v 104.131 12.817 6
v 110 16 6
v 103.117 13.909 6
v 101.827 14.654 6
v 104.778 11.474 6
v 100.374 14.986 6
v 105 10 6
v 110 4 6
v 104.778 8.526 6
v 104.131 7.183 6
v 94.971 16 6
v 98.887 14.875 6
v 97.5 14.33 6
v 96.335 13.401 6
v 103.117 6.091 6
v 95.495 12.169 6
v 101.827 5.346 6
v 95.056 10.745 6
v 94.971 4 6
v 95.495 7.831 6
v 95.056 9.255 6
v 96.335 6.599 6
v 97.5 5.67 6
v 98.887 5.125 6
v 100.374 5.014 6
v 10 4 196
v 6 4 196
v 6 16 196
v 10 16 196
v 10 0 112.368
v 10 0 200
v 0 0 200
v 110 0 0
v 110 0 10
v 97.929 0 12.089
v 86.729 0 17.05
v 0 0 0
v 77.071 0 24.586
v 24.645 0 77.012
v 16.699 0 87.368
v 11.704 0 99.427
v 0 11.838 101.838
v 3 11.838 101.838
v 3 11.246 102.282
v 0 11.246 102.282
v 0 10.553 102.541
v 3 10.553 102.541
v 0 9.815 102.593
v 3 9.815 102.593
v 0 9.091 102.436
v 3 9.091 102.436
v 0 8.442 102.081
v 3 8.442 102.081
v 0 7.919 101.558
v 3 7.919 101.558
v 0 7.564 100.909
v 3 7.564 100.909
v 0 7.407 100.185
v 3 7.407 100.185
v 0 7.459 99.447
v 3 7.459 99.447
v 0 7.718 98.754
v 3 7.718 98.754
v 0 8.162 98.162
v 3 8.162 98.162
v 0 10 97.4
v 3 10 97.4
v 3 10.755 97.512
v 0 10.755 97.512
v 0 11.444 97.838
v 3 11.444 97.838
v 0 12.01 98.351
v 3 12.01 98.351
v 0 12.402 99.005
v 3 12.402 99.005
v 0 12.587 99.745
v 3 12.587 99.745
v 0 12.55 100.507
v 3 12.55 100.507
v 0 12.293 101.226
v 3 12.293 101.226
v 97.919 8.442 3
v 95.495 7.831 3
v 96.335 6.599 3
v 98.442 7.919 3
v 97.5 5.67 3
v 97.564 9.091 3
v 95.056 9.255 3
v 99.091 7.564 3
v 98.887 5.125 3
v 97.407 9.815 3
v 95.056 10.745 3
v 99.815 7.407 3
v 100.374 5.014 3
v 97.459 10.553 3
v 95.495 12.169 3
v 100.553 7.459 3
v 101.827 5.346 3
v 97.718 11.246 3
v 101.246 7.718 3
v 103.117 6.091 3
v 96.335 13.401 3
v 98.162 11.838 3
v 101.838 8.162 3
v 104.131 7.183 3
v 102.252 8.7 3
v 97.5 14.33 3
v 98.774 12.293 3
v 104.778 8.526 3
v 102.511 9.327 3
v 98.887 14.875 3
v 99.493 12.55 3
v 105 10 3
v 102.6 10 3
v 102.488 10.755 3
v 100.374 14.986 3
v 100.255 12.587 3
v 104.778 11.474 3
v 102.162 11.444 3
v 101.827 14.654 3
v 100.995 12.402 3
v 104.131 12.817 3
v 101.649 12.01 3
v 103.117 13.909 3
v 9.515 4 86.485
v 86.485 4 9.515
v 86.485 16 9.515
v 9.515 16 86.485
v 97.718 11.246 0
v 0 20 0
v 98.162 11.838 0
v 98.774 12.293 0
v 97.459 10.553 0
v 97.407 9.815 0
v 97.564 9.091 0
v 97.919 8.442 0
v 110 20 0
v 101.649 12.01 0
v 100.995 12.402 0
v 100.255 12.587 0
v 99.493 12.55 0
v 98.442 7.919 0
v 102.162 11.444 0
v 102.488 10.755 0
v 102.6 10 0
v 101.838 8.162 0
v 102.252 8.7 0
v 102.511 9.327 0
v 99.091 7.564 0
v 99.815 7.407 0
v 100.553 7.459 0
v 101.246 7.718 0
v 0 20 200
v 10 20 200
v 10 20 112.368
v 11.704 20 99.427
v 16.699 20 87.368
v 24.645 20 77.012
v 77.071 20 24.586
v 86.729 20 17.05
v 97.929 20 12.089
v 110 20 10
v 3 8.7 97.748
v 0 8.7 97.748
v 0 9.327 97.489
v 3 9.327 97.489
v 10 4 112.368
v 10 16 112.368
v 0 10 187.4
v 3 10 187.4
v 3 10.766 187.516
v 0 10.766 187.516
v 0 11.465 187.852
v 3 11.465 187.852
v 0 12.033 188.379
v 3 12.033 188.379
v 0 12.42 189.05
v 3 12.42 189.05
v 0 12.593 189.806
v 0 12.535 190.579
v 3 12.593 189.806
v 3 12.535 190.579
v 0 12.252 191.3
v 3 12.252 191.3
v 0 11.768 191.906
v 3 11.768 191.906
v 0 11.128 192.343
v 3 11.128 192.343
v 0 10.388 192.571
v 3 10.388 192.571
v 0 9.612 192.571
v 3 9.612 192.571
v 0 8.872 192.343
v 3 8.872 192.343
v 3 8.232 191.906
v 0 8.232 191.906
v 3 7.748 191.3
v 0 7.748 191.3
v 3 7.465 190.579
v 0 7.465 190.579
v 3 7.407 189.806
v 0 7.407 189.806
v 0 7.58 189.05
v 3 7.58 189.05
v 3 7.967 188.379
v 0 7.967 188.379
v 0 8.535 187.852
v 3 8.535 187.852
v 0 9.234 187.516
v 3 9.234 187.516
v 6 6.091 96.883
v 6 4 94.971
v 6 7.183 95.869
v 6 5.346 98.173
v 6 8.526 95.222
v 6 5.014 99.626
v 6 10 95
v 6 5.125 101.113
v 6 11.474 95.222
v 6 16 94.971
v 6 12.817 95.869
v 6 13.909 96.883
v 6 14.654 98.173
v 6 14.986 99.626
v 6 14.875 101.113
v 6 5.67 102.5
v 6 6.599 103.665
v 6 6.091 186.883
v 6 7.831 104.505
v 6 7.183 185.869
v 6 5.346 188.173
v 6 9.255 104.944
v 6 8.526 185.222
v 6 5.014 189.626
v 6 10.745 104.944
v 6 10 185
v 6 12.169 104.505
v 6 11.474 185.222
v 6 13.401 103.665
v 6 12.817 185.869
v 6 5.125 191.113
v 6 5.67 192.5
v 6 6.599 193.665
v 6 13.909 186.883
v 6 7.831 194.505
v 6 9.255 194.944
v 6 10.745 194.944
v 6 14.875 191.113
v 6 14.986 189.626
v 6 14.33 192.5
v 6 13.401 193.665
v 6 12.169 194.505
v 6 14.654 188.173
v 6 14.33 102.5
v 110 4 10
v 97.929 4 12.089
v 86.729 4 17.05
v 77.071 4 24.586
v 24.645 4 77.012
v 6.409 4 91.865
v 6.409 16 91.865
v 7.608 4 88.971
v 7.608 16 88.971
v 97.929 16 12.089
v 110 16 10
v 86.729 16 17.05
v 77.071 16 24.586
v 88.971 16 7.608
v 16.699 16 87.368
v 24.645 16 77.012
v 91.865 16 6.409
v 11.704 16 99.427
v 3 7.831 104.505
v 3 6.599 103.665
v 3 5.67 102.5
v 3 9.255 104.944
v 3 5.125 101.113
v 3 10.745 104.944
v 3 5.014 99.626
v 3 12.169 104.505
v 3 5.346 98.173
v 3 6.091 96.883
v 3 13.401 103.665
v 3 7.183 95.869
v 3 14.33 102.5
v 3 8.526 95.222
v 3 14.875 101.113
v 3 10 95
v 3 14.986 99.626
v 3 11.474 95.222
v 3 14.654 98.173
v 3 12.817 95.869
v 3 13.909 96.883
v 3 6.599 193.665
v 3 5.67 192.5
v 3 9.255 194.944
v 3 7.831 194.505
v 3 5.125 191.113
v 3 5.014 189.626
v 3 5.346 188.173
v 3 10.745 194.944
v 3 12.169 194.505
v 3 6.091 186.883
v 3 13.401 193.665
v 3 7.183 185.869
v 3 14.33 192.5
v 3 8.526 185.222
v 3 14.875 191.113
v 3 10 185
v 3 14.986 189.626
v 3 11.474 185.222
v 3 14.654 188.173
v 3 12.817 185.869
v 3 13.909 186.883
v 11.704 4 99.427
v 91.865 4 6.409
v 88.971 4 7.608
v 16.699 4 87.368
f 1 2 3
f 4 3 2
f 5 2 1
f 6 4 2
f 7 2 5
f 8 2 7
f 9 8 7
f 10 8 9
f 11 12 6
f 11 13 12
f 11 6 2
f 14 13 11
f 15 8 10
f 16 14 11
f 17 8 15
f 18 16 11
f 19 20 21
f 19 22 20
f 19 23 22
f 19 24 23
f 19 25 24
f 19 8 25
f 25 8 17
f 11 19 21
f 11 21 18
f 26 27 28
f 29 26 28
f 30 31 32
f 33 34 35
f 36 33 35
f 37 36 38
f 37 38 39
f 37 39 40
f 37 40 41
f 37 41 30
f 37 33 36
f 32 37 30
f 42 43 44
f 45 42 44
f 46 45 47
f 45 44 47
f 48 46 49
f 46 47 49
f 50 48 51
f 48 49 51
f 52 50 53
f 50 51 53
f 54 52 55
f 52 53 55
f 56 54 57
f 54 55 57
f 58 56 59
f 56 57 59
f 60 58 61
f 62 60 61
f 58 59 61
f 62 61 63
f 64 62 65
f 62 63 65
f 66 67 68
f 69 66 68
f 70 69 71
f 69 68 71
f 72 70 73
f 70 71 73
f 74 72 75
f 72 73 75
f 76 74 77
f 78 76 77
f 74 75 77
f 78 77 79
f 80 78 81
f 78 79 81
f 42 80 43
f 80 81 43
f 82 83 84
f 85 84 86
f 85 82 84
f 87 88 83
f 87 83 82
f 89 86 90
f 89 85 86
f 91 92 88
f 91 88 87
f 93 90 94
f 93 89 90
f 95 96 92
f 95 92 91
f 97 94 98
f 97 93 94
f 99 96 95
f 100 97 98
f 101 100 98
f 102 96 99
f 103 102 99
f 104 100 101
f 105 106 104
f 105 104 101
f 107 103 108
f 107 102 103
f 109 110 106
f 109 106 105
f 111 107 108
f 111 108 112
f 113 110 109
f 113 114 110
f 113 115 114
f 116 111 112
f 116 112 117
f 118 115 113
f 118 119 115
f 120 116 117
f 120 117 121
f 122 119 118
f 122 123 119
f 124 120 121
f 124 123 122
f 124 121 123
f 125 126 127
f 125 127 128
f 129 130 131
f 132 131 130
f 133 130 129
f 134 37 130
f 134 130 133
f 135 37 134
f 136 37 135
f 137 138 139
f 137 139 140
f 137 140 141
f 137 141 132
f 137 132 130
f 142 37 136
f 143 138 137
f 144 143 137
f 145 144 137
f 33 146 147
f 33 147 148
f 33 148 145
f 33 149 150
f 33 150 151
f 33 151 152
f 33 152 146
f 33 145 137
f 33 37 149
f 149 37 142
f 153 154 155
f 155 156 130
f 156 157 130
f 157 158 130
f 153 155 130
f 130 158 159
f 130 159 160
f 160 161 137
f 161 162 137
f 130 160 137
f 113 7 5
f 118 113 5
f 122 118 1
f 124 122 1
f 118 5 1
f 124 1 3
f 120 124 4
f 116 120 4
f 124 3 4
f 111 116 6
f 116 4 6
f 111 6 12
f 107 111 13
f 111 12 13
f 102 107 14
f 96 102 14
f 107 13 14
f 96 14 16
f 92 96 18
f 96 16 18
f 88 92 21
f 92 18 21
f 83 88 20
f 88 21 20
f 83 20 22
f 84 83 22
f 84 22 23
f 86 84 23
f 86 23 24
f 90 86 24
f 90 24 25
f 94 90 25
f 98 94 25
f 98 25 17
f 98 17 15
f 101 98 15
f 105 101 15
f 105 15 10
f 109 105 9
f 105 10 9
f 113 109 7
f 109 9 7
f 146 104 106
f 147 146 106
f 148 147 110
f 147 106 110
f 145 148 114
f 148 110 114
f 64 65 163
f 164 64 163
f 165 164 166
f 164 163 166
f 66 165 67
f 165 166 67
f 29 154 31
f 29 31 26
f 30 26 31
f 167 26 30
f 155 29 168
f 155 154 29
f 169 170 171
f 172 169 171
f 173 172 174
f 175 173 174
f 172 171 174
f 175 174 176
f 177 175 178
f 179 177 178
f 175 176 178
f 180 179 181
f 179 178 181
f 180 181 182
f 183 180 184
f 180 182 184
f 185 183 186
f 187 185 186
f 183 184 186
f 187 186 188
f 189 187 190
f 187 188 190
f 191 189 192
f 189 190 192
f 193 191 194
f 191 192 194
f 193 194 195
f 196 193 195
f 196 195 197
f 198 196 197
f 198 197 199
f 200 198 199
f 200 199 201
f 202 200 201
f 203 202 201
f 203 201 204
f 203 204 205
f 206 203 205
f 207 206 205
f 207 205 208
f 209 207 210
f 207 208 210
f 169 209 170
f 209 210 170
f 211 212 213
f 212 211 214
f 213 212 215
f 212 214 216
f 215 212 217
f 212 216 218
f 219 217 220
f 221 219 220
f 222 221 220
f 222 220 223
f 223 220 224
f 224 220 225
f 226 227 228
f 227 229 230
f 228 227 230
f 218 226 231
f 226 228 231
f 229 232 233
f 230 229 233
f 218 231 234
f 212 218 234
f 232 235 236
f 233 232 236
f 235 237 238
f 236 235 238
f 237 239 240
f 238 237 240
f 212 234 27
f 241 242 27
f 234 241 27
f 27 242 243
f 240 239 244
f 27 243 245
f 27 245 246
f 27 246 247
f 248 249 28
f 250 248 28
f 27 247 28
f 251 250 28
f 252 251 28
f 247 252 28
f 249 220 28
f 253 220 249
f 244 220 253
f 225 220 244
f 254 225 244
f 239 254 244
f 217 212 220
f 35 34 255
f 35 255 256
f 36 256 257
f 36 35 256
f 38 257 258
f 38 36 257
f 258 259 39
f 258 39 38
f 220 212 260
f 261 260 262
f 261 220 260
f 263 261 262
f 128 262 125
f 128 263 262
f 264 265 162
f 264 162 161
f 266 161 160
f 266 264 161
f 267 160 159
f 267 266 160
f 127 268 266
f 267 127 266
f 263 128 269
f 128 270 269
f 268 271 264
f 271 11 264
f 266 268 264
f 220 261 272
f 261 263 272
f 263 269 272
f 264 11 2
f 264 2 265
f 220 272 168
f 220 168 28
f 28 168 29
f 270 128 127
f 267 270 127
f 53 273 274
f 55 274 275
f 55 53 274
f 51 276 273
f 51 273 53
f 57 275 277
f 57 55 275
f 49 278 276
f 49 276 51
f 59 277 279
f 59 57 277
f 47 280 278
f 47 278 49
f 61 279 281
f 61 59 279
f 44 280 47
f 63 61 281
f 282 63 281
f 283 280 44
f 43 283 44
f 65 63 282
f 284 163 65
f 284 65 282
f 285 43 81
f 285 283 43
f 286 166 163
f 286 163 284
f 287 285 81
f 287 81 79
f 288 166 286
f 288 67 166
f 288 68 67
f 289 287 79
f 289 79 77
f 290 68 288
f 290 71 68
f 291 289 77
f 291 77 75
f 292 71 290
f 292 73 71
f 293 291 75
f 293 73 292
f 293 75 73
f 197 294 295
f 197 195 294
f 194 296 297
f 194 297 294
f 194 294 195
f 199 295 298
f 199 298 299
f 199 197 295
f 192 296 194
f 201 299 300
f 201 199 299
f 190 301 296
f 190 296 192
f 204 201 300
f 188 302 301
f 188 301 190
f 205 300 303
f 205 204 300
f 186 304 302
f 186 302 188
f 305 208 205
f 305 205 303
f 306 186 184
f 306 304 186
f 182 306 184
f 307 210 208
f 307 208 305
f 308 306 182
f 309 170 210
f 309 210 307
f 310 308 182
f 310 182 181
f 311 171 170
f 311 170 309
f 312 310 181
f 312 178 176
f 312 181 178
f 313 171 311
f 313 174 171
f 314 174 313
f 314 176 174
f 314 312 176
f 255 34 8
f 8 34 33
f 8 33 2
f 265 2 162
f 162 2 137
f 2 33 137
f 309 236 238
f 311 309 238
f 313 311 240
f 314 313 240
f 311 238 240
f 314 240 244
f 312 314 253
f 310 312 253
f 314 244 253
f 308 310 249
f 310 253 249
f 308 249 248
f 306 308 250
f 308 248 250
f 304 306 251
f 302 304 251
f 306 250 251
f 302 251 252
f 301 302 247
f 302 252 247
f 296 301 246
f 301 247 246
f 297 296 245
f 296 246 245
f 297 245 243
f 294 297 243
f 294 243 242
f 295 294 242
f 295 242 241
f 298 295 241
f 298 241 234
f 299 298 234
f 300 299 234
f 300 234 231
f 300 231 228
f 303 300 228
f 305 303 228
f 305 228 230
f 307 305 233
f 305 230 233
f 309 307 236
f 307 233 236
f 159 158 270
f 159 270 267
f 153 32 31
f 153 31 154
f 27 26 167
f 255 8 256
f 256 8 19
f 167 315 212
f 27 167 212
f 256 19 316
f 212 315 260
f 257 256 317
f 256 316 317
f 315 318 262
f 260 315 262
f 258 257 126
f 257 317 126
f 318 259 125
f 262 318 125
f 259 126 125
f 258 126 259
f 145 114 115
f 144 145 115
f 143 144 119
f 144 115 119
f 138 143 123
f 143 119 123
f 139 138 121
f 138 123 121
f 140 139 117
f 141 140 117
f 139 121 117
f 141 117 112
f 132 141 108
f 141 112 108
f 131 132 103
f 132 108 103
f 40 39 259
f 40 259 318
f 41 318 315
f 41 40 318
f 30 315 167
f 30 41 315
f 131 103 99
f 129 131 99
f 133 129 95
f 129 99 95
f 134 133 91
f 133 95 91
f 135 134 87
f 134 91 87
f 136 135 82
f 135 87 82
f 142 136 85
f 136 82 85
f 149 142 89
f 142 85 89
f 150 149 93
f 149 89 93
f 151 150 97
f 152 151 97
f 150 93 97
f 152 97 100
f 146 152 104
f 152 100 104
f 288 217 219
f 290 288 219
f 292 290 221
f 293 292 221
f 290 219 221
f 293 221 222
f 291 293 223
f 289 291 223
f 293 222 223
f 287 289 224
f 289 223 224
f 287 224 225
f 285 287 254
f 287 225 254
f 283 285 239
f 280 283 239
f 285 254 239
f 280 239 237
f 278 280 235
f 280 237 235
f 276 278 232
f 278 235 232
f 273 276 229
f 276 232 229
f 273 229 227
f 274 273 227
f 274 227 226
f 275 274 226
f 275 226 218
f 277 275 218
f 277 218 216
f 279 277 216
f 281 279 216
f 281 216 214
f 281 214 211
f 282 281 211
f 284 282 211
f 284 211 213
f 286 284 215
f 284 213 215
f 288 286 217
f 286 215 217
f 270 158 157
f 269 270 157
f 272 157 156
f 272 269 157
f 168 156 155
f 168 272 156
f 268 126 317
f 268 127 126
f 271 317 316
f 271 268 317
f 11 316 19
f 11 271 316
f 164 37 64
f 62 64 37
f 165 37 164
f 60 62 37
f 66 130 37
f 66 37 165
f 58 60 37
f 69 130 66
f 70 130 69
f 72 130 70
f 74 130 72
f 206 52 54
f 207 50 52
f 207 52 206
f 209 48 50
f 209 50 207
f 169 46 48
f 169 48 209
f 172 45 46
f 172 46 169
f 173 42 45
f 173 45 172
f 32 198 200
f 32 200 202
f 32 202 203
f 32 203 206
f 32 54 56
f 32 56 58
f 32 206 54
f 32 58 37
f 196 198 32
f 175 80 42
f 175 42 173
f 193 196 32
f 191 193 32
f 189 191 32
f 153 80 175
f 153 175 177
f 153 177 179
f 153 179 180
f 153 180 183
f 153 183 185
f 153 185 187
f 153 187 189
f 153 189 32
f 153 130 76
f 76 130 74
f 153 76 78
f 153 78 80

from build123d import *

# Parameters (mm, degrees)
EXTRUDE_1_DEPTH     = 20
CUT_EXTRUDE_1_DEPTH = 20
SKETCH_3_R          = 5
CUT_EXTRUDE_2_DEPTH = 3
CUT_EXTRUDE_3_DEPTH = 6
SKETCH_5_R          = 5
CUT_EXTRUDE_4_DEPTH = 3
SKETCH_6_W          = 90
SKETCH_6_H          = 20
EXTRUDE_2_DEPTH     = 6
SKETCH_7_R          = 5
CUT_EXTRUDE_5_DEPTH = 3
SKETCH_8_R          = 2.6
CUT_EXTRUDE_6_DEPTH = 3
SKETCH_11_W         = 118.79393924
SKETCH_11_H         = 4
EXTRUDE_4_DEPTH     = 4
SKETCH_12_W         = 110
SKETCH_12_H         = 4
EXTRUDE_5_DEPTH     = 4
SKETCH_13_W         = 20
SKETCH_13_H         = 4
EXTRUDE_6_DEPTH     = 4
FILLET_2_R          = 12
FILLET_3_R          = 50
SKETCH_14_W         = 4
SKETCH_14_H         = 12
EXTRUDE_7_DEPTH     = 4


with BuildPart() as part:
    # 草图1 → 凸台-拉伸1 (new body)
    with BuildSketch(Plane(origin=(0, 0, 0), x_dir=(1, 0, 0), z_dir=(0, 1, 0))):
        Polygon((0, 0), (110, 0), (110, -6), (90, -6), (6, -90), (6, -110), (0, -110), align=None)
    extrude(amount=EXTRUDE_1_DEPTH)

    # 草图2 → 切除-拉伸1 (cut)
    with BuildSketch(Plane(origin=(6, 0, 0), x_dir=(0, 0, -1), z_dir=(1, 0, 0))):
        with BuildLine():
            ThreePointArc((-97.4, 10), (-99.005023076, 12.402086785), (-101.838477631, 11.838477631))
            Line((-101.838477631, 11.838477631), (-98.161522369, 8.161522369))
            ThreePointArc((-98.161522369, 8.161522369), (-97.597913215, 9.005023076), (-97.4, 10))
        make_face()
        with BuildLine():
            Line((-98.161522369, 8.161522369), (-101.838477631, 11.838477631))
            ThreePointArc((-101.838477631, 11.838477631), (-101.838477631, 8.161522369), (-98.161522369, 8.161522369))
        make_face()
    extrude(amount=-CUT_EXTRUDE_1_DEPTH, mode=Mode.SUBTRACT)

    # 草图3 → 切除-拉伸2 (cut)
    with BuildSketch(Plane(origin=(6, 0, 0), x_dir=(0, 0, -1), z_dir=(1, 0, 0))):
        with Locations((-100, 10)):
            Circle(SKETCH_3_R)
    extrude(amount=-CUT_EXTRUDE_2_DEPTH, mode=Mode.SUBTRACT)

    # 草图4 → 切除-拉伸3 (cut)
    with BuildSketch(Plane.XY.offset(6)):
        with BuildLine():
            ThreePointArc((102.6, 10), (100.994976924, 12.402086785), (98.161522369, 11.838477631))
            Line((98.161522369, 11.838477631), (101.838477631, 8.161522369))
            ThreePointArc((101.838477631, 8.161522369), (102.402086785, 9.005023076), (102.6, 10))
        make_face()
        with BuildLine():
            Line((101.838477631, 8.161522369), (98.161522369, 11.838477631))
            ThreePointArc((98.161522369, 11.838477631), (98.161522369, 8.161522369), (101.838477631, 8.161522369))
        make_face()
    extrude(amount=-CUT_EXTRUDE_3_DEPTH, mode=Mode.SUBTRACT)

    # 草图5 → 切除-拉伸4 (cut)
    with BuildSketch(Plane.XY.offset(6)):
        with Locations((100, 10)):
            Circle(SKETCH_5_R)
    extrude(amount=-CUT_EXTRUDE_4_DEPTH, mode=Mode.SUBTRACT)

    # 草图6 → 凸台-拉伸2 (add)
    with BuildSketch(Plane.ZY):
        with Locations((155, 10)):
            Rectangle(SKETCH_6_W, SKETCH_6_H)
    extrude(amount=-EXTRUDE_2_DEPTH)

    # 草图7 → 切除-拉伸5 (cut)
    with BuildSketch(Plane(origin=(6, 0, 0), x_dir=(0, 0, -1), z_dir=(1, 0, 0))):
        with Locations((-190, 10)):
            Circle(SKETCH_7_R)
    extrude(amount=-CUT_EXTRUDE_5_DEPTH, mode=Mode.SUBTRACT)

    # 草图8 → 切除-拉伸6 (cut)
    with BuildSketch(Plane(origin=(3, 0, 0), x_dir=(0, 0, -1), z_dir=(1, 0, 0))):
        with Locations((-190, 10)):
            Circle(SKETCH_8_R)
    extrude(amount=-CUT_EXTRUDE_6_DEPTH, mode=Mode.SUBTRACT)

    # 草图11 → 凸台-拉伸4 (add)
    with BuildSketch(Plane(origin=(48, 0, 48), x_dir=(0.7071067811865475, 0, -0.7071067811865476), z_dir=(0.7071067811865476, 0, 0.7071067811865475))):
        with Locations((0, 18)):
            Rectangle(SKETCH_11_W, SKETCH_11_H)
        with Locations((0, 2)):
            Rectangle(SKETCH_11_W, SKETCH_11_H)
    extrude(amount=EXTRUDE_4_DEPTH)

    # 草图12 → 凸台-拉伸5 (add)
    with BuildSketch(Plane(origin=(6, 0, 0), x_dir=(0, 0, -1), z_dir=(1, 0, 0))):
        with Locations((-145, 18)):
            Rectangle(SKETCH_12_W, SKETCH_12_H)
        with Locations((-145, 2)):
            Rectangle(SKETCH_12_W, SKETCH_12_H)
    extrude(amount=EXTRUDE_5_DEPTH)

    # 草图13 → 凸台-拉伸6 (add)
    with BuildSketch(Plane.XY.offset(6)):
        with Locations((100, 18)):
            Rectangle(SKETCH_13_W, SKETCH_13_H)
        with Locations((100, 2)):
            Rectangle(SKETCH_13_W, SKETCH_13_H)
    extrude(amount=EXTRUDE_6_DEPTH)

    # 圆角2
    fillet_2_edges = [part.edges().sort_by_distance(p)[0] for p in [
        (90, 10, 6),
        (6, 10, 90),
    ]]
    fillet(fillet_2_edges, radius=FILLET_2_R)

    # 圆角3
    # the kernel refuses this fillet: 50 mm, written as the material it adds along each edge
    with BuildSketch(Plane(origin=(10, 0, 91.656854249), x_dir=(0, 0, 1), z_dir=(0, 1, 0))) as fillet_3_piece_1:
        with BuildLine():
            CenterArc((FILLET_3_R * 0.414213562373, FILLET_3_R), FILLET_3_R, 225, 45)
            Line((-FILLET_3_R * 0.292893218813, FILLET_3_R * 0.292893218813), (-FILLET_3_R * 0.307035354437, FILLET_3_R * 0.27875108319))
            Line((-FILLET_3_R * 0.307035354437, FILLET_3_R * 0.27875108319), (-FILLET_3_R * 0.00828427124746, -FILLET_3_R * 0.02))
            Line((-FILLET_3_R * 0.00828427124746, -FILLET_3_R * 0.02), (FILLET_3_R * 0.414213562373, -FILLET_3_R * 0.02))
            Line((FILLET_3_R * 0.414213562373, -FILLET_3_R * 0.02), (FILLET_3_R * 0.414213562373, 0))
        make_face()
    extrude(amount=4)
    with BuildSketch(Plane(origin=(10, 0, 91.656854249), x_dir=(0, 0, 1), z_dir=(0, 1, 0))) as fillet_3_piece_2_section:
        with BuildLine():
            CenterArc((FILLET_3_R * 0.414213562373, FILLET_3_R), FILLET_3_R, 225, 45)
            Line((-FILLET_3_R * 0.292893218813, FILLET_3_R * 0.292893218813), (-FILLET_3_R * 0.307035354437, FILLET_3_R * 0.27875108319))
            Line((-FILLET_3_R * 0.307035354437, FILLET_3_R * 0.27875108319), (-FILLET_3_R * 0.00828427124746, -FILLET_3_R * 0.02))
            Line((-FILLET_3_R * 0.00828427124746, -FILLET_3_R * 0.02), (FILLET_3_R * 0.414213562373, -FILLET_3_R * 0.02))
            Line((FILLET_3_R * 0.414213562373, -FILLET_3_R * 0.02), (FILLET_3_R * 0.414213562373, 0))
        make_face()
    fillet_3_piece_2 = extrude(amount=55.776695297, mode=Mode.PRIVATE)
    fillet_3_piece_2 = split(fillet_3_piece_2, bisect_by=Plane(origin=(13.090507107, 16, 92.936984208), z_dir=(0, 1, 0)), keep=Keep.TOP, mode=Mode.PRIVATE)
    fillet_3_piece_2 = split(fillet_3_piece_2, bisect_by=Plane(origin=(13.090507107, 20, 92.936984208), z_dir=(0, -1, 0)), keep=Keep.TOP, mode=Mode.PRIVATE)
    add(fillet_3_piece_2)
    with BuildSketch(Plane(origin=(10, 20, 91.656854249), x_dir=(0, 0, 1), z_dir=(0, -1, 0))) as fillet_3_piece_3:
        with BuildLine():
            CenterArc((FILLET_3_R * 0.414213562373, -FILLET_3_R), FILLET_3_R, 90, 45)
            Line((-FILLET_3_R * 0.292893218813, -FILLET_3_R * 0.292893218813), (-FILLET_3_R * 0.307035354437, -FILLET_3_R * 0.27875108319))
            Line((-FILLET_3_R * 0.307035354437, -FILLET_3_R * 0.27875108319), (-FILLET_3_R * 0.00828427124746, FILLET_3_R * 0.02))
            Line((-FILLET_3_R * 0.00828427124746, FILLET_3_R * 0.02), (FILLET_3_R * 0.414213562373, FILLET_3_R * 0.02))
            Line((FILLET_3_R * 0.414213562373, FILLET_3_R * 0.02), (FILLET_3_R * 0.414213562373, 0))
        make_face()
    extrude(amount=4)
    with BuildSketch(Plane(origin=(10, 20, 91.656854249), x_dir=(0, 0, 1), z_dir=(0, -1, 0))) as fillet_3_piece_4_section:
        with BuildLine():
            CenterArc((FILLET_3_R * 0.414213562373, -FILLET_3_R), FILLET_3_R, 90, 45)
            Line((-FILLET_3_R * 0.292893218813, -FILLET_3_R * 0.292893218813), (-FILLET_3_R * 0.307035354437, -FILLET_3_R * 0.27875108319))
            Line((-FILLET_3_R * 0.307035354437, -FILLET_3_R * 0.27875108319), (-FILLET_3_R * 0.00828427124746, FILLET_3_R * 0.02))
            Line((-FILLET_3_R * 0.00828427124746, FILLET_3_R * 0.02), (FILLET_3_R * 0.414213562373, FILLET_3_R * 0.02))
            Line((FILLET_3_R * 0.414213562373, FILLET_3_R * 0.02), (FILLET_3_R * 0.414213562373, 0))
        make_face()
    fillet_3_piece_4 = extrude(amount=55.776695297, mode=Mode.PRIVATE)
    fillet_3_piece_4 = split(fillet_3_piece_4, bisect_by=Plane(origin=(13.090507107, 4, 92.936984208), z_dir=(0, -1, 0)), keep=Keep.TOP, mode=Mode.PRIVATE)
    fillet_3_piece_4 = split(fillet_3_piece_4, bisect_by=Plane(origin=(13.090507107, 0, 92.936984208), z_dir=(0, 1, 0)), keep=Keep.TOP, mode=Mode.PRIVATE)
    add(fillet_3_piece_4)
    with BuildSketch(Plane(origin=(91.656854249, 0, 10), x_dir=(1, 0, 0), z_dir=(0, 1, 0))) as fillet_3_piece_5:
        with BuildLine():
            CenterArc((20.769589097, -49.941089022), FILLET_3_R, 92.781591787, 42.218408213)
            Line((-14.585749963, -14.585749963), (-15.292856744, -13.878643181))
            Line((-15.292856744, -13.878643181), (-0.707106781, 0.707106781))
            Line((-0.707106781, 0.707106781), (0, 1))
            ThreePointArc((0, 1), (9.171572875, 1), (18.294616884, 0.99882178))
            Line((18.294616884, 0.99882178), (18.343145751, 0))
        make_face()
    extrude(amount=4)
    with BuildSketch(Plane(origin=(91.656854249, 0, 10), x_dir=(1, 0, 0), z_dir=(0, 1, 0))) as fillet_3_piece_6_section:
        with BuildLine():
            CenterArc((20.769589097, -49.941089022), FILLET_3_R, 92.781591787, 42.218408213)
            Line((-14.585749963, -14.585749963), (-15.292856744, -13.878643181))
            Line((-15.292856744, -13.878643181), (-0.707106781, 0.707106781))
            Line((-0.707106781, 0.707106781), (0, 1))
            ThreePointArc((0, 1), (9.171572875, 1), (18.294616884, 0.99882178))
            Line((18.294616884, 0.99882178), (18.343145751, 0))
        make_face()
    fillet_3_piece_6 = extrude(amount=55.568413536, mode=Mode.PRIVATE)
    fillet_3_piece_6 = split(fillet_3_piece_6, bisect_by=Plane(origin=(92.410386276, 16, 13.180383565), z_dir=(0, 1, 0)), keep=Keep.TOP, mode=Mode.PRIVATE)
    fillet_3_piece_6 = split(fillet_3_piece_6, bisect_by=Plane(origin=(92.410386276, 20, 13.180383565), z_dir=(0, -1, 0)), keep=Keep.TOP, mode=Mode.PRIVATE)
    add(fillet_3_piece_6)
    with BuildSketch(Plane(origin=(91.656854249, 20, 10), x_dir=(1, 0, 0), z_dir=(0, -1, 0))) as fillet_3_piece_7:
        with BuildLine():
            CenterArc((20.769589097, 49.941089022), FILLET_3_R, 225, 42.218408213)
            Line((-14.585749963, 14.585749963), (-15.292856744, 13.878643181))
            Line((-15.292856744, 13.878643181), (-0.707106781, -0.707106781))
            Line((-0.707106781, -0.707106781), (0, -1))
            ThreePointArc((0, -1), (9.171572875, -1), (18.294616884, -0.99882178))
            Line((18.294616884, -0.99882178), (18.343145751, 0))
        make_face()
    extrude(amount=4)
    with BuildSketch(Plane(origin=(91.656854249, 20, 10), x_dir=(1, 0, 0), z_dir=(0, -1, 0))) as fillet_3_piece_8_section:
        with BuildLine():
            CenterArc((20.769589097, 49.941089022), FILLET_3_R, 225, 42.218408213)
            Line((-14.585749963, 14.585749963), (-15.292856744, 13.878643181))
            Line((-15.292856744, 13.878643181), (-0.707106781, -0.707106781))
            Line((-0.707106781, -0.707106781), (0, -1))
            ThreePointArc((0, -1), (9.171572875, -1), (18.294616884, -0.99882178))
            Line((18.294616884, -0.99882178), (18.343145751, 0))
        make_face()
    fillet_3_piece_8 = extrude(amount=55.568413536, mode=Mode.PRIVATE)
    fillet_3_piece_8 = split(fillet_3_piece_8, bisect_by=Plane(origin=(92.410386276, 4, 13.180383565), z_dir=(0, -1, 0)), keep=Keep.TOP, mode=Mode.PRIVATE)
    fillet_3_piece_8 = split(fillet_3_piece_8, bisect_by=Plane(origin=(92.410386276, 0, 13.180383565), z_dir=(0, 1, 0)), keep=Keep.TOP, mode=Mode.PRIVATE)
    add(fillet_3_piece_8)

    # 草图14 → 凸台-拉伸7 (add)
    with BuildSketch(Plane(origin=(6, 0, 0), x_dir=(0, 0, -1), z_dir=(1, 0, 0))):
        with Locations((-198, 10)):
            Rectangle(SKETCH_14_W, SKETCH_14_H)
    extrude(amount=EXTRUDE_7_DEPTH)


solid = part.part
